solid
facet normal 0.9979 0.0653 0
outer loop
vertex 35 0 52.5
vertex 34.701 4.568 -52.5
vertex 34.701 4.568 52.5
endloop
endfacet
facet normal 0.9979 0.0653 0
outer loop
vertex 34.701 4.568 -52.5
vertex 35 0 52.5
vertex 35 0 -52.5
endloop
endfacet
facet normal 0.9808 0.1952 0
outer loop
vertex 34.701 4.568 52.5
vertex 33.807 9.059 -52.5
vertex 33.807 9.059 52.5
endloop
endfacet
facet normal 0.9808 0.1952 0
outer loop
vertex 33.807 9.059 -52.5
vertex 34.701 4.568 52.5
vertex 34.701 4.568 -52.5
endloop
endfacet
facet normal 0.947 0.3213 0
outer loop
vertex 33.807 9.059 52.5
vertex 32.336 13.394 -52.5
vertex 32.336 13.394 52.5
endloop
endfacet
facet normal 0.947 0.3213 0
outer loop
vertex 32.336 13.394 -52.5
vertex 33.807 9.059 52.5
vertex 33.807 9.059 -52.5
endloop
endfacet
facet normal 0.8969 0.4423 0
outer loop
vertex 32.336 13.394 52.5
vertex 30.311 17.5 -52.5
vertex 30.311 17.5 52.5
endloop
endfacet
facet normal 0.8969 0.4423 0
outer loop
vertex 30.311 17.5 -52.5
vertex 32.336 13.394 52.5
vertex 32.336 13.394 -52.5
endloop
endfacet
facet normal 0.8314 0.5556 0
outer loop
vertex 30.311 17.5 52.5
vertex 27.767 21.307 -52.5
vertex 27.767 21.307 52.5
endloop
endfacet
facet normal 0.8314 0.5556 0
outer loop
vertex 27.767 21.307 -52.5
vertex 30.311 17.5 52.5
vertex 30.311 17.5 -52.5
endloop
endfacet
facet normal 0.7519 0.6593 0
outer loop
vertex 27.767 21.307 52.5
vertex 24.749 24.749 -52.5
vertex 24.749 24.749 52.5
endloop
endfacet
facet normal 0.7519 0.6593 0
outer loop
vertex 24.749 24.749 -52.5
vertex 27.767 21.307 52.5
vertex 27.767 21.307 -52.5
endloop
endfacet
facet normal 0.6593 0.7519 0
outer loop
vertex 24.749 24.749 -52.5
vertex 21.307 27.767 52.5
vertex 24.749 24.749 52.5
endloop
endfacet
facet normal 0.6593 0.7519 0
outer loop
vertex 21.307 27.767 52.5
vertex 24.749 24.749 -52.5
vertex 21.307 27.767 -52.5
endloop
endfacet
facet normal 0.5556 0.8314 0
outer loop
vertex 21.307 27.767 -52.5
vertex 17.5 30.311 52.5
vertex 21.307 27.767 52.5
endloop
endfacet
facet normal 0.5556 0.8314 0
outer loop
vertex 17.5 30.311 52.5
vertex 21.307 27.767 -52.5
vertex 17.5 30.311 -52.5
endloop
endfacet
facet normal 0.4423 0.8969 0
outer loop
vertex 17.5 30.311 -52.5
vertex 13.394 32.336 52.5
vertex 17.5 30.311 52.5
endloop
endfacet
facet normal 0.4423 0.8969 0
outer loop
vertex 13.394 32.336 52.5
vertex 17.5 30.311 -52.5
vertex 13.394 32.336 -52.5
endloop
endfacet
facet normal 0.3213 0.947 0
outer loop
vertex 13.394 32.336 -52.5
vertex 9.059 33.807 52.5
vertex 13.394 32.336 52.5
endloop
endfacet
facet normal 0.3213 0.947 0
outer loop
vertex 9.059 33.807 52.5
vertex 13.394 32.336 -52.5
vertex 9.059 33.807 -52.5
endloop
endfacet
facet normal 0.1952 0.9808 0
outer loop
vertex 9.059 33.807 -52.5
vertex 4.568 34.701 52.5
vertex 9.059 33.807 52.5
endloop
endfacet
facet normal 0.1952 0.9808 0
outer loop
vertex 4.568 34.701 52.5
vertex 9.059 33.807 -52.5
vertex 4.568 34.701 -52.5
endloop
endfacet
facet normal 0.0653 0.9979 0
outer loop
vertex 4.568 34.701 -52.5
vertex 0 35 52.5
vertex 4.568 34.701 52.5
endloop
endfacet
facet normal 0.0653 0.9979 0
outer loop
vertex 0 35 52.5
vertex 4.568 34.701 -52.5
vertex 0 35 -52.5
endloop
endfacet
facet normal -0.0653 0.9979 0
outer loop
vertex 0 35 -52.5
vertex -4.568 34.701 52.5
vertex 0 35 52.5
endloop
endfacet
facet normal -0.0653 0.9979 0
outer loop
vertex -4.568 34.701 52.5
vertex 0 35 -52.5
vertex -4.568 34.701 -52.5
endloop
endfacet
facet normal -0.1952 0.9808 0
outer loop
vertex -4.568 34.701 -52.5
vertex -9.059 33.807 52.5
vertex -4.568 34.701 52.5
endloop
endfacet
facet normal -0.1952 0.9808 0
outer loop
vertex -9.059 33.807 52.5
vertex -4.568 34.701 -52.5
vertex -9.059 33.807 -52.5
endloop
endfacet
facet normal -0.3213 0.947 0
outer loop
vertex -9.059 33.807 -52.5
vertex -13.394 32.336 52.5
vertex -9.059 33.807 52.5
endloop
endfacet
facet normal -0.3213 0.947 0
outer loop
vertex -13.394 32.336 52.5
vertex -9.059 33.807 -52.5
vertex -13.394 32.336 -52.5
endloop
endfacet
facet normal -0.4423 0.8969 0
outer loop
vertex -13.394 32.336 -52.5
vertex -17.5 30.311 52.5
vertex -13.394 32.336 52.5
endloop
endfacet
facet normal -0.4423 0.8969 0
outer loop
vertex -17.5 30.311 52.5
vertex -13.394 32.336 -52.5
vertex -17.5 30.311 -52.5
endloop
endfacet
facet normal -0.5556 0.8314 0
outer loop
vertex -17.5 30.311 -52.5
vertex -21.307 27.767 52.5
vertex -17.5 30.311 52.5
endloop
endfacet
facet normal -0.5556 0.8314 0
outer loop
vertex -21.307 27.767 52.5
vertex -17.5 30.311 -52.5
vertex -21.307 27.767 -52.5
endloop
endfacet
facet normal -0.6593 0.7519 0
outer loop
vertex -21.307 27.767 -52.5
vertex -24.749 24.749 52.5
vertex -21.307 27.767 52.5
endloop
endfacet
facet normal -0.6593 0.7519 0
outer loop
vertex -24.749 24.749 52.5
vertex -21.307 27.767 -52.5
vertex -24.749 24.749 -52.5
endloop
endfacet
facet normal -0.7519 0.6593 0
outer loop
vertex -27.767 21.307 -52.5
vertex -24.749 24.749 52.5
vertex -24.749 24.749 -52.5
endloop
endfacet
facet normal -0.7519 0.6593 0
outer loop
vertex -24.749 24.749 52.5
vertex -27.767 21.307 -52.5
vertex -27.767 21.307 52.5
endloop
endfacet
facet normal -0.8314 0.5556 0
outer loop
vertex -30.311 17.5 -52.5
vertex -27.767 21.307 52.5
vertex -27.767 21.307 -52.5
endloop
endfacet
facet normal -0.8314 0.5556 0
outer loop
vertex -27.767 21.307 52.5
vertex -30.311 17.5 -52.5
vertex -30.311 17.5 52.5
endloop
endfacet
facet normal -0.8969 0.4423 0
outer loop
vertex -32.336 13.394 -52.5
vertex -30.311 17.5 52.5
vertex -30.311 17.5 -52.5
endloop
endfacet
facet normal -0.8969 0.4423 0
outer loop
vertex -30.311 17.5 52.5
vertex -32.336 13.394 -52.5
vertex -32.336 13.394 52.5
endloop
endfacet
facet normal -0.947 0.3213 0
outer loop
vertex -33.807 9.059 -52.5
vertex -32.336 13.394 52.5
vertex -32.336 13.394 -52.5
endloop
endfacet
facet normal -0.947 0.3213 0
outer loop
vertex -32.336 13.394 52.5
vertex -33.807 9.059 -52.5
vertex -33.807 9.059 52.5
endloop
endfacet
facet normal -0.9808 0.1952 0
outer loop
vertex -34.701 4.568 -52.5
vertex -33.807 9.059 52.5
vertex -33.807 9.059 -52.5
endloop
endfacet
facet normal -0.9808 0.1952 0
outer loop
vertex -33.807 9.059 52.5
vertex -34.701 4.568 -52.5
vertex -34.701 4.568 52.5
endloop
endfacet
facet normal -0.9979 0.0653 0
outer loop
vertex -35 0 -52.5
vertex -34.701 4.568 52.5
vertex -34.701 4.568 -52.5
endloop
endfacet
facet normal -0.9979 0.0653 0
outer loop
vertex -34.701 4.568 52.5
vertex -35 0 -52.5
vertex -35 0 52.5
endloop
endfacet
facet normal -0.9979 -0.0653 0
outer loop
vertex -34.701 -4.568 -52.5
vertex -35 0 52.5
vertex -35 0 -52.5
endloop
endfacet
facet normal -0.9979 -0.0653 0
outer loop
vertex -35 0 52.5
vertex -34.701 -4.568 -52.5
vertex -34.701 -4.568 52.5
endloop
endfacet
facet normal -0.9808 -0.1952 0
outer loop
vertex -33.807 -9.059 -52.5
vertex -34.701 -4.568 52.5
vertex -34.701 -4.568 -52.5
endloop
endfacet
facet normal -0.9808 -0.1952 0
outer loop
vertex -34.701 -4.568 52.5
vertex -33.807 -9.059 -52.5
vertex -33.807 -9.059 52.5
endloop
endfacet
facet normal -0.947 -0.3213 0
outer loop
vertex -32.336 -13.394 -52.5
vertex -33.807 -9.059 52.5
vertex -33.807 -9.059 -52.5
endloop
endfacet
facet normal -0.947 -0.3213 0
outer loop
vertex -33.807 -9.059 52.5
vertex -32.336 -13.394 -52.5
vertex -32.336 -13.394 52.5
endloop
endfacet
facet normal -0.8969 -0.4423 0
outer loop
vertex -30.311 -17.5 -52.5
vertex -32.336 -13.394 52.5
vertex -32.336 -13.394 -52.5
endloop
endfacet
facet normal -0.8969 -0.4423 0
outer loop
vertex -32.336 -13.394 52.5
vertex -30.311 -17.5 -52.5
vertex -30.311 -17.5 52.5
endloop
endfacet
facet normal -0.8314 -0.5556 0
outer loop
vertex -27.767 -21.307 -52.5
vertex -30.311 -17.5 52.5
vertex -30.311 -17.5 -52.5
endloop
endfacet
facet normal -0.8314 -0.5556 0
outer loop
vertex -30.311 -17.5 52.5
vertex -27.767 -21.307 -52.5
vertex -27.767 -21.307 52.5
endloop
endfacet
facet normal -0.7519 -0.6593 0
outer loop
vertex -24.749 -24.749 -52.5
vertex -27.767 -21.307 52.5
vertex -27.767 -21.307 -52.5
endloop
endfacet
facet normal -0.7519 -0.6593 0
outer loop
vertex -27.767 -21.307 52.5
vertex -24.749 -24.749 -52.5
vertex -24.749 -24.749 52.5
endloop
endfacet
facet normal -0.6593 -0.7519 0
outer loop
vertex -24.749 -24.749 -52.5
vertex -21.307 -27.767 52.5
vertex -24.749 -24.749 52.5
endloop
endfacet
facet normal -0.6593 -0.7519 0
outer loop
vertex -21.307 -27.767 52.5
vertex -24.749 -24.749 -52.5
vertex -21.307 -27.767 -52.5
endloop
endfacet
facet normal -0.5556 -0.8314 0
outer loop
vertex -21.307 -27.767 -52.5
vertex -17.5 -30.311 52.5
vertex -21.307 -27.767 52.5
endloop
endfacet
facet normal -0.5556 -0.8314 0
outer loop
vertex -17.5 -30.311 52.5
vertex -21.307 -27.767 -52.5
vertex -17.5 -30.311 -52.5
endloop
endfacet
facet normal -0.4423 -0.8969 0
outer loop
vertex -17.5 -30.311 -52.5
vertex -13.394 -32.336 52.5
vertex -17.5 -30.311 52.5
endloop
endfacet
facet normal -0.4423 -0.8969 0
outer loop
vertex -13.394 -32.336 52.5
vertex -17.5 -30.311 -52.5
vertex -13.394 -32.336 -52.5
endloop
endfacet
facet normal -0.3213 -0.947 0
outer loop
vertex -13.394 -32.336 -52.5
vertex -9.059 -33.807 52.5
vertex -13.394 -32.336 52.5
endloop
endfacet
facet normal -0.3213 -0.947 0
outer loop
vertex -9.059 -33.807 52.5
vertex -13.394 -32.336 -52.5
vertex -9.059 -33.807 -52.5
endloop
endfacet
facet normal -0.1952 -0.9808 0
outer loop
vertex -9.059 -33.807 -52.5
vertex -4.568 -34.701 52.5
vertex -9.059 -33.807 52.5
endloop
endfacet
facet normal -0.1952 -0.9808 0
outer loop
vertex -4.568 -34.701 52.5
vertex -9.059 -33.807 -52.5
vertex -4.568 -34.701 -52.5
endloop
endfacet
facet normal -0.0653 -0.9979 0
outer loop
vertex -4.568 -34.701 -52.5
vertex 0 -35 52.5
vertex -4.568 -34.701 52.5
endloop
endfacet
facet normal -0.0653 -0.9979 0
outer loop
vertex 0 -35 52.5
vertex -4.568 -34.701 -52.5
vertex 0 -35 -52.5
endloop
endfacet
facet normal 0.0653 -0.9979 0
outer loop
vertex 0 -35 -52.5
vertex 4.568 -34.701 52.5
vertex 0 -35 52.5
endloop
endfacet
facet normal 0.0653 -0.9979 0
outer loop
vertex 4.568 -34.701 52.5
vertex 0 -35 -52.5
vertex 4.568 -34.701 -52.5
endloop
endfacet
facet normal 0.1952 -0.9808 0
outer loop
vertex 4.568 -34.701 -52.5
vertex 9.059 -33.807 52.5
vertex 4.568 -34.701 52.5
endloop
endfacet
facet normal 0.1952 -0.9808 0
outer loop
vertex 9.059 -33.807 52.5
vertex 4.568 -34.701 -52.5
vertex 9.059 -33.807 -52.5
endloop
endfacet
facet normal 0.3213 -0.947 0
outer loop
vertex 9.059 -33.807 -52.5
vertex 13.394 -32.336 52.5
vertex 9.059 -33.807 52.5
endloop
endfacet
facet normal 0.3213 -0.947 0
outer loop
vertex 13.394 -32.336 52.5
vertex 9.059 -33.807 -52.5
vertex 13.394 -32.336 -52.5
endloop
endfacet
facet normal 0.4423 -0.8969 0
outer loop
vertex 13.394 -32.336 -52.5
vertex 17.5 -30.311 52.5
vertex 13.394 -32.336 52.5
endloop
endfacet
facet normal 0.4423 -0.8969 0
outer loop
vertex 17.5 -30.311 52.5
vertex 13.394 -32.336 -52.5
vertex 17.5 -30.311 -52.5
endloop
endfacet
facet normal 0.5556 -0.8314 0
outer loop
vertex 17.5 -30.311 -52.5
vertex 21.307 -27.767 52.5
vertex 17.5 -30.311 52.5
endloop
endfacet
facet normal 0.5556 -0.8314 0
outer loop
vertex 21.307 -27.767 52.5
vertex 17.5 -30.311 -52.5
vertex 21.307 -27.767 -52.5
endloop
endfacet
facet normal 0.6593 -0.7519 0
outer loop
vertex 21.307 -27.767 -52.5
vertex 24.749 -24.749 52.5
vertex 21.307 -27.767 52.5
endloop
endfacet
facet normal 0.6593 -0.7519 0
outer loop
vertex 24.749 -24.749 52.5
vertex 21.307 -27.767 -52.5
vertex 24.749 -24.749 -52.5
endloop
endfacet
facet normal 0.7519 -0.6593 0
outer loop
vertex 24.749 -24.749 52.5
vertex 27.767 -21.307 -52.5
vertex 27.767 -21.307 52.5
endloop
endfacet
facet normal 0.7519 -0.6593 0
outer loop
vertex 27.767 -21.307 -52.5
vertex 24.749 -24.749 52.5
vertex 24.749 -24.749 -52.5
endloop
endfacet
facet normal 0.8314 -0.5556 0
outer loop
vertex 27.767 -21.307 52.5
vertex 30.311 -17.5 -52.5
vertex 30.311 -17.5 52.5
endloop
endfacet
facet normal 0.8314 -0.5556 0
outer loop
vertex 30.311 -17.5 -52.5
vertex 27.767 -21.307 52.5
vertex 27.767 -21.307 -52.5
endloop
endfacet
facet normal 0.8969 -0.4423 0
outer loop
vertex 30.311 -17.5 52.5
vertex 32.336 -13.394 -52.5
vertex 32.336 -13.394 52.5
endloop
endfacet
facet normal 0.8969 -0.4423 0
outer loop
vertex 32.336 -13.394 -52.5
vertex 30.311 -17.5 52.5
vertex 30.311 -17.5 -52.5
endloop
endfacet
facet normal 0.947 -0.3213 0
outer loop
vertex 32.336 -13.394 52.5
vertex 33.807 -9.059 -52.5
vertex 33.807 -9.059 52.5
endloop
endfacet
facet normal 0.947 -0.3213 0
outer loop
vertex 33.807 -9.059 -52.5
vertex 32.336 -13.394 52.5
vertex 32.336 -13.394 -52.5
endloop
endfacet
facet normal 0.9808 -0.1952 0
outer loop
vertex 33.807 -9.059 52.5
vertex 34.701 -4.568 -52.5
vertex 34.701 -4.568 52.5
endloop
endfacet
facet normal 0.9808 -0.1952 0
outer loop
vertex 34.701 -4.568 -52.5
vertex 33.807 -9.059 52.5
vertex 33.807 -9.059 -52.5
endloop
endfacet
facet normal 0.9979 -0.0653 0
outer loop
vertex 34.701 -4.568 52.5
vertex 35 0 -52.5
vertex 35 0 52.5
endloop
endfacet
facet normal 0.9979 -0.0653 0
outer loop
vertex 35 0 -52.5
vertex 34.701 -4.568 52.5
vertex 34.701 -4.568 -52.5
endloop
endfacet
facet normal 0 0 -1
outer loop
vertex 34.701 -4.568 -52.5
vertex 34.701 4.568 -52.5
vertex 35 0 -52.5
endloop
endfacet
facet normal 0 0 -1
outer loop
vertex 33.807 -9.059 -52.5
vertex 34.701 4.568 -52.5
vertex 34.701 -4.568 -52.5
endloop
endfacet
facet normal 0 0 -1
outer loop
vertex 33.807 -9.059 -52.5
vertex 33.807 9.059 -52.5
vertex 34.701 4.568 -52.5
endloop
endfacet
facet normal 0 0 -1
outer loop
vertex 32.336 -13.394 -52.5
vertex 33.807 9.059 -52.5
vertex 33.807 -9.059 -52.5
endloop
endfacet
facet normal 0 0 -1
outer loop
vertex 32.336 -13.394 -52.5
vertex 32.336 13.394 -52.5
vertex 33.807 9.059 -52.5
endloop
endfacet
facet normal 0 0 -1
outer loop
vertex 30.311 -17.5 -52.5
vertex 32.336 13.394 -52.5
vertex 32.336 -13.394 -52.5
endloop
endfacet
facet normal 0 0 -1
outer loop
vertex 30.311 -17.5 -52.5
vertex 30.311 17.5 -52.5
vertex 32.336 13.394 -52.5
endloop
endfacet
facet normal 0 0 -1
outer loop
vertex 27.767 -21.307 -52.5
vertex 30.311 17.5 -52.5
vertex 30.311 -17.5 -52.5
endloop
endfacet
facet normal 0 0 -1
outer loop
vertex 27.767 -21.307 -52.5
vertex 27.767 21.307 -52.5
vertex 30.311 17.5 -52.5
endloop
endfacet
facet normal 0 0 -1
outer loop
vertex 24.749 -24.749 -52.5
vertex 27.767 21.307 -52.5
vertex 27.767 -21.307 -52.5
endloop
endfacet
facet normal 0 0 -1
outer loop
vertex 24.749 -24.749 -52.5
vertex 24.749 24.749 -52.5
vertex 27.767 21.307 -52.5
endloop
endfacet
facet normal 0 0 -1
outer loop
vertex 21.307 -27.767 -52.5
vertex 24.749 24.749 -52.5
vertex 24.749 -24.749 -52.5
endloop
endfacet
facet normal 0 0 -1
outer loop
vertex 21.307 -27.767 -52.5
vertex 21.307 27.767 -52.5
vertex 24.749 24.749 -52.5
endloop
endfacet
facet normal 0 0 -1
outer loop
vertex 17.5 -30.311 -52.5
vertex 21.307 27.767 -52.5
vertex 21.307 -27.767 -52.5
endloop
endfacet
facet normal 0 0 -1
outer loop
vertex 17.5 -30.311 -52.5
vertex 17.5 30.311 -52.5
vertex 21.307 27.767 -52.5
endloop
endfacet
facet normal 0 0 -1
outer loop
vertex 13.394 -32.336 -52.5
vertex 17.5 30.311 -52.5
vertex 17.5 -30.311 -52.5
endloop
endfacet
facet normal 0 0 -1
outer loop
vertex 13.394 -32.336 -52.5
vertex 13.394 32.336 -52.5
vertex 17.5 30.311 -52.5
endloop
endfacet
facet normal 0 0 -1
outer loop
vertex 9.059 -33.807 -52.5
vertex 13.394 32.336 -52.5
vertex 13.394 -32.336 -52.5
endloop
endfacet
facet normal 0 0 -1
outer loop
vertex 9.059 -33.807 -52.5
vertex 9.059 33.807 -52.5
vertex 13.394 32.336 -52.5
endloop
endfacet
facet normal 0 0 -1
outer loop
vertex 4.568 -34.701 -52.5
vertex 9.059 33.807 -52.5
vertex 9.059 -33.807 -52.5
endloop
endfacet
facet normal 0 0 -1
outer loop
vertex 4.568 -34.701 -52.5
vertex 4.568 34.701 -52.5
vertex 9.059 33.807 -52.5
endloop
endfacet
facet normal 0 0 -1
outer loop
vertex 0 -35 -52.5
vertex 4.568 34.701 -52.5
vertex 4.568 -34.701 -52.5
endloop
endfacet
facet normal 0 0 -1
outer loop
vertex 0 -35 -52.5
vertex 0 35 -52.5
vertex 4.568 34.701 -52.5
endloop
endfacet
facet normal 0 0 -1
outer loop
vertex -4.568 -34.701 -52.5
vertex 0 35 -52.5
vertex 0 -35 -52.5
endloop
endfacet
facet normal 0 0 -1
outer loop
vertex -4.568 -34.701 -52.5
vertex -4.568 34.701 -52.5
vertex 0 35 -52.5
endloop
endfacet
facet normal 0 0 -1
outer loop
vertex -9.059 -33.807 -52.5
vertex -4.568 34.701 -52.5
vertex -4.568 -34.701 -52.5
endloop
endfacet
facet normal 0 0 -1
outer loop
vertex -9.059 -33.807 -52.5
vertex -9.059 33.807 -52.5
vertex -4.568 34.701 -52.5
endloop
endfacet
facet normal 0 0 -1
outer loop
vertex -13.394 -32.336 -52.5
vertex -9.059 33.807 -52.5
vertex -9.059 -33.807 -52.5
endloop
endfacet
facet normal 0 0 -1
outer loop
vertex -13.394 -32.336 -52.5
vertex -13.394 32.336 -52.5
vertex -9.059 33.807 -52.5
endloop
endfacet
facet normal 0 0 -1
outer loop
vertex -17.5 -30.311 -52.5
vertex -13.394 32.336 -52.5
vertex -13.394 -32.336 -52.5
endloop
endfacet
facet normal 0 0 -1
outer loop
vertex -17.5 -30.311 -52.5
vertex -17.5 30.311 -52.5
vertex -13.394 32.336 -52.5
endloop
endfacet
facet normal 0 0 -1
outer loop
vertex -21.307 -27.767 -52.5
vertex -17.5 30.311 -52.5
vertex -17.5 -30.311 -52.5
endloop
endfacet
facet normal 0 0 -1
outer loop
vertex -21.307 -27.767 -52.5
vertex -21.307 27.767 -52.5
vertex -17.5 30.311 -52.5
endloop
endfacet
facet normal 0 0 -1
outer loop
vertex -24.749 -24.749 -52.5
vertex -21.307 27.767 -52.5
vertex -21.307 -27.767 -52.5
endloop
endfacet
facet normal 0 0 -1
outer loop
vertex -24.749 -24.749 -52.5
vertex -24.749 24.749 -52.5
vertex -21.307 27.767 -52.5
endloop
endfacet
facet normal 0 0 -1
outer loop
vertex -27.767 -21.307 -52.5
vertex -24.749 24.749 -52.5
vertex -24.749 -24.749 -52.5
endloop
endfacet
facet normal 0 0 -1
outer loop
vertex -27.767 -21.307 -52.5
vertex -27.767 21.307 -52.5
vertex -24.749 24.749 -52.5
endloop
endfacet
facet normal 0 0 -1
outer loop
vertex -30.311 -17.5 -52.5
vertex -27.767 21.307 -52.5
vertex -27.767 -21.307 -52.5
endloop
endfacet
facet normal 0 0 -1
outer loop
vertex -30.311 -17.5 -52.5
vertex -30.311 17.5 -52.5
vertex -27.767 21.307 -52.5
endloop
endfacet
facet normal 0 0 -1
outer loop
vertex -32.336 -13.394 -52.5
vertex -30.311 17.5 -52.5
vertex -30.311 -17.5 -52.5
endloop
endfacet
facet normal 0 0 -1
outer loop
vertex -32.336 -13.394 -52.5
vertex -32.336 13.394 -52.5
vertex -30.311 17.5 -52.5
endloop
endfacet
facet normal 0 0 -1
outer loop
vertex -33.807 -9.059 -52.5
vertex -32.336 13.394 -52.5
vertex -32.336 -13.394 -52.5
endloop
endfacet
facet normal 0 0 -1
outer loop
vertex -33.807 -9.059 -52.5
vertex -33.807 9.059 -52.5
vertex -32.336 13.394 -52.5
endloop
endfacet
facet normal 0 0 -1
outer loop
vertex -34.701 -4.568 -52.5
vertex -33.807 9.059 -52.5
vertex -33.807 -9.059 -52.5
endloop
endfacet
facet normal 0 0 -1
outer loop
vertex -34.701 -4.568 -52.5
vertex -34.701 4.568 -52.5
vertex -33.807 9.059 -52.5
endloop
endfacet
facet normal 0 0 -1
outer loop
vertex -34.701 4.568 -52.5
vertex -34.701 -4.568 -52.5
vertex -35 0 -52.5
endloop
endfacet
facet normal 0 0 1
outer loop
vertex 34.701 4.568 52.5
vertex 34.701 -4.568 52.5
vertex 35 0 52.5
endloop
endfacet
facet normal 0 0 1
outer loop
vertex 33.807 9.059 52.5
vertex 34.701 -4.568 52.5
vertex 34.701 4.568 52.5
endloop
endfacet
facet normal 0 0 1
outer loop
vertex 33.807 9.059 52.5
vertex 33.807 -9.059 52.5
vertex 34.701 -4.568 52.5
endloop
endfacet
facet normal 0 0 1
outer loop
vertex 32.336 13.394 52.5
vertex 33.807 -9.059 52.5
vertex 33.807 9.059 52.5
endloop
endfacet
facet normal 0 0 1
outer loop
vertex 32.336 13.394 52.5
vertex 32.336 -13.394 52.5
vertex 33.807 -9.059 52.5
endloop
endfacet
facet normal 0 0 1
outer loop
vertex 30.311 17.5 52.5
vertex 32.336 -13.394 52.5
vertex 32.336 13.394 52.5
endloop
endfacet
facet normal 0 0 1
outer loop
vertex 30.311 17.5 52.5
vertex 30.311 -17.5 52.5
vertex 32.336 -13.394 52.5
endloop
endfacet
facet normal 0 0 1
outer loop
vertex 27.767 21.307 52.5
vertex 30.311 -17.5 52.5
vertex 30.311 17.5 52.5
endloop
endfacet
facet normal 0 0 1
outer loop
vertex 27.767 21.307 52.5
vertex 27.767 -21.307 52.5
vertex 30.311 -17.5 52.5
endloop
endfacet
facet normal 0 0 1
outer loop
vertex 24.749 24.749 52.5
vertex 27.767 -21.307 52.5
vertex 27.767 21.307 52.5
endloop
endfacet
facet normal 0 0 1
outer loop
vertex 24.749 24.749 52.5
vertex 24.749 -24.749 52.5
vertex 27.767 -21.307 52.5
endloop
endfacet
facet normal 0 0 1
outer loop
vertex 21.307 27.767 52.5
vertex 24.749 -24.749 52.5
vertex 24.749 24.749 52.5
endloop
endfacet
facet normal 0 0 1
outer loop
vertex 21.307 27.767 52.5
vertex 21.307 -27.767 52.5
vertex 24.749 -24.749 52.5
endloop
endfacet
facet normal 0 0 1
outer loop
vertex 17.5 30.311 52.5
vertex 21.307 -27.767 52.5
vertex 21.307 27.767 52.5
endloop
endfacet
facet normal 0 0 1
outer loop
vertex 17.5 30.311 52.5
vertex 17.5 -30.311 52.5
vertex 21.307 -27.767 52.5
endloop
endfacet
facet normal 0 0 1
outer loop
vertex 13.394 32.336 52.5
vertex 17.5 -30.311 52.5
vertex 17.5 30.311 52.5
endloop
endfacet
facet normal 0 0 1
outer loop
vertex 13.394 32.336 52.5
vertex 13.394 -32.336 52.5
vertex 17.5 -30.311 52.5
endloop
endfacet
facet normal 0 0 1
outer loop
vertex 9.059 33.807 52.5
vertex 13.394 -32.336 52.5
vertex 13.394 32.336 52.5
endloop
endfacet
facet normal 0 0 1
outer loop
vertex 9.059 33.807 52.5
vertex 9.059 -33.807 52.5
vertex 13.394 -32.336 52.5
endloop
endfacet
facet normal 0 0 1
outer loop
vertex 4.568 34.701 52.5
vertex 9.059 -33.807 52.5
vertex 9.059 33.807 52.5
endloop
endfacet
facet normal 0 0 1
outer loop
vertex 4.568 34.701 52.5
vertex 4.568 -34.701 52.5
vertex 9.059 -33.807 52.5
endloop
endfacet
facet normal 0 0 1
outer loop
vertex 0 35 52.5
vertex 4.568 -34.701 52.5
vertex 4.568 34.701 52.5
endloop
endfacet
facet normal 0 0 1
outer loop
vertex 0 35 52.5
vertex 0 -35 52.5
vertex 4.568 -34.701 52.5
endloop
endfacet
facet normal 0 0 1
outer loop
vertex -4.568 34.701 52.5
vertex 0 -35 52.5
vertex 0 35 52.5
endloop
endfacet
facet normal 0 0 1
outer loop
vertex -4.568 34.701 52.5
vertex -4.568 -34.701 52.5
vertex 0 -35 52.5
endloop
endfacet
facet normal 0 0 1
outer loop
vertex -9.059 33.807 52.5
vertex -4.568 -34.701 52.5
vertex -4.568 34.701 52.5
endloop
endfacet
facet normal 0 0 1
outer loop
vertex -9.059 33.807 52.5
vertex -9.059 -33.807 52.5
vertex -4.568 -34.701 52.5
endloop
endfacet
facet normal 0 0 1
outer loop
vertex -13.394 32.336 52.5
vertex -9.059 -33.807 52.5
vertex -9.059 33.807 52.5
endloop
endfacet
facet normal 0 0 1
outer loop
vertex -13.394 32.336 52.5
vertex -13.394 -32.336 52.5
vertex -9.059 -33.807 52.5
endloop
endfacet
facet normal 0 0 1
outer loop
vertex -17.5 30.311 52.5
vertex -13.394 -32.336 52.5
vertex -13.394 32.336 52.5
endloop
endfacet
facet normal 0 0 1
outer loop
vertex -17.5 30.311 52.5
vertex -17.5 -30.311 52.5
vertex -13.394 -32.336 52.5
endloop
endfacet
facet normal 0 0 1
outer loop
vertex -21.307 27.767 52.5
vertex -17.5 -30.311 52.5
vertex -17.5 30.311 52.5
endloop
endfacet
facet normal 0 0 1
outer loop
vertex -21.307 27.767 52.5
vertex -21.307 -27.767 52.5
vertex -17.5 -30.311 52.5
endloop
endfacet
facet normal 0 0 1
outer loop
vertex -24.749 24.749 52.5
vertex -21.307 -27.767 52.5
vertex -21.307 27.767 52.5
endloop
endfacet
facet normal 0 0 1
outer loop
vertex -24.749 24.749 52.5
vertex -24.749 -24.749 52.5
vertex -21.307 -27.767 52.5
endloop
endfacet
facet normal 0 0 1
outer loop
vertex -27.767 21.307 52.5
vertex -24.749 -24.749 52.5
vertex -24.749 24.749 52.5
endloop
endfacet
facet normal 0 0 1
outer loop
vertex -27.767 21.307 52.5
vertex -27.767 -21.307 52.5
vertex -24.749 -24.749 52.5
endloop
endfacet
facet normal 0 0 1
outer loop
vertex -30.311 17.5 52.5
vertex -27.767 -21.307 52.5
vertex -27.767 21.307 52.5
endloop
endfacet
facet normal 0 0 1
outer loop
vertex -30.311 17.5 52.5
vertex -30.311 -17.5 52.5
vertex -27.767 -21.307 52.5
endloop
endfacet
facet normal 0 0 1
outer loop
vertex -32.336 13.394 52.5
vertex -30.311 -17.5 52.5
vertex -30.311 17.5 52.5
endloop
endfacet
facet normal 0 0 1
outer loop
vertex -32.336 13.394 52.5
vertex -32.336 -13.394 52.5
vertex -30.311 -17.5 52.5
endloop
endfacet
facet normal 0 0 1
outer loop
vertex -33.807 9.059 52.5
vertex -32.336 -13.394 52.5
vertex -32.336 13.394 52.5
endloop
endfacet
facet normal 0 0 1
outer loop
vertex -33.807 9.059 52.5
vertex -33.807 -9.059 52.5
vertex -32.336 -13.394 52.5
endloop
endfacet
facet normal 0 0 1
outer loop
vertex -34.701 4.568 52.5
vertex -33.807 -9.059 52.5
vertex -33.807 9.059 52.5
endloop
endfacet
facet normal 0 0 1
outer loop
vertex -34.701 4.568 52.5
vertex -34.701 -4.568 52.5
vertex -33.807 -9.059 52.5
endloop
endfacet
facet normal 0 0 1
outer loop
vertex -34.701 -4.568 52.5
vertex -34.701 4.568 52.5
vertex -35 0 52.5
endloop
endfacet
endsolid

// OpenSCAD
// ========================================
// a cylinder with radius 35 mm and height 105 mm
// NeuroCAD canonical IR; dimensions are millimetres
// ========================================
$fn = 48;

cylinder(r=35, h=105, center=true);
